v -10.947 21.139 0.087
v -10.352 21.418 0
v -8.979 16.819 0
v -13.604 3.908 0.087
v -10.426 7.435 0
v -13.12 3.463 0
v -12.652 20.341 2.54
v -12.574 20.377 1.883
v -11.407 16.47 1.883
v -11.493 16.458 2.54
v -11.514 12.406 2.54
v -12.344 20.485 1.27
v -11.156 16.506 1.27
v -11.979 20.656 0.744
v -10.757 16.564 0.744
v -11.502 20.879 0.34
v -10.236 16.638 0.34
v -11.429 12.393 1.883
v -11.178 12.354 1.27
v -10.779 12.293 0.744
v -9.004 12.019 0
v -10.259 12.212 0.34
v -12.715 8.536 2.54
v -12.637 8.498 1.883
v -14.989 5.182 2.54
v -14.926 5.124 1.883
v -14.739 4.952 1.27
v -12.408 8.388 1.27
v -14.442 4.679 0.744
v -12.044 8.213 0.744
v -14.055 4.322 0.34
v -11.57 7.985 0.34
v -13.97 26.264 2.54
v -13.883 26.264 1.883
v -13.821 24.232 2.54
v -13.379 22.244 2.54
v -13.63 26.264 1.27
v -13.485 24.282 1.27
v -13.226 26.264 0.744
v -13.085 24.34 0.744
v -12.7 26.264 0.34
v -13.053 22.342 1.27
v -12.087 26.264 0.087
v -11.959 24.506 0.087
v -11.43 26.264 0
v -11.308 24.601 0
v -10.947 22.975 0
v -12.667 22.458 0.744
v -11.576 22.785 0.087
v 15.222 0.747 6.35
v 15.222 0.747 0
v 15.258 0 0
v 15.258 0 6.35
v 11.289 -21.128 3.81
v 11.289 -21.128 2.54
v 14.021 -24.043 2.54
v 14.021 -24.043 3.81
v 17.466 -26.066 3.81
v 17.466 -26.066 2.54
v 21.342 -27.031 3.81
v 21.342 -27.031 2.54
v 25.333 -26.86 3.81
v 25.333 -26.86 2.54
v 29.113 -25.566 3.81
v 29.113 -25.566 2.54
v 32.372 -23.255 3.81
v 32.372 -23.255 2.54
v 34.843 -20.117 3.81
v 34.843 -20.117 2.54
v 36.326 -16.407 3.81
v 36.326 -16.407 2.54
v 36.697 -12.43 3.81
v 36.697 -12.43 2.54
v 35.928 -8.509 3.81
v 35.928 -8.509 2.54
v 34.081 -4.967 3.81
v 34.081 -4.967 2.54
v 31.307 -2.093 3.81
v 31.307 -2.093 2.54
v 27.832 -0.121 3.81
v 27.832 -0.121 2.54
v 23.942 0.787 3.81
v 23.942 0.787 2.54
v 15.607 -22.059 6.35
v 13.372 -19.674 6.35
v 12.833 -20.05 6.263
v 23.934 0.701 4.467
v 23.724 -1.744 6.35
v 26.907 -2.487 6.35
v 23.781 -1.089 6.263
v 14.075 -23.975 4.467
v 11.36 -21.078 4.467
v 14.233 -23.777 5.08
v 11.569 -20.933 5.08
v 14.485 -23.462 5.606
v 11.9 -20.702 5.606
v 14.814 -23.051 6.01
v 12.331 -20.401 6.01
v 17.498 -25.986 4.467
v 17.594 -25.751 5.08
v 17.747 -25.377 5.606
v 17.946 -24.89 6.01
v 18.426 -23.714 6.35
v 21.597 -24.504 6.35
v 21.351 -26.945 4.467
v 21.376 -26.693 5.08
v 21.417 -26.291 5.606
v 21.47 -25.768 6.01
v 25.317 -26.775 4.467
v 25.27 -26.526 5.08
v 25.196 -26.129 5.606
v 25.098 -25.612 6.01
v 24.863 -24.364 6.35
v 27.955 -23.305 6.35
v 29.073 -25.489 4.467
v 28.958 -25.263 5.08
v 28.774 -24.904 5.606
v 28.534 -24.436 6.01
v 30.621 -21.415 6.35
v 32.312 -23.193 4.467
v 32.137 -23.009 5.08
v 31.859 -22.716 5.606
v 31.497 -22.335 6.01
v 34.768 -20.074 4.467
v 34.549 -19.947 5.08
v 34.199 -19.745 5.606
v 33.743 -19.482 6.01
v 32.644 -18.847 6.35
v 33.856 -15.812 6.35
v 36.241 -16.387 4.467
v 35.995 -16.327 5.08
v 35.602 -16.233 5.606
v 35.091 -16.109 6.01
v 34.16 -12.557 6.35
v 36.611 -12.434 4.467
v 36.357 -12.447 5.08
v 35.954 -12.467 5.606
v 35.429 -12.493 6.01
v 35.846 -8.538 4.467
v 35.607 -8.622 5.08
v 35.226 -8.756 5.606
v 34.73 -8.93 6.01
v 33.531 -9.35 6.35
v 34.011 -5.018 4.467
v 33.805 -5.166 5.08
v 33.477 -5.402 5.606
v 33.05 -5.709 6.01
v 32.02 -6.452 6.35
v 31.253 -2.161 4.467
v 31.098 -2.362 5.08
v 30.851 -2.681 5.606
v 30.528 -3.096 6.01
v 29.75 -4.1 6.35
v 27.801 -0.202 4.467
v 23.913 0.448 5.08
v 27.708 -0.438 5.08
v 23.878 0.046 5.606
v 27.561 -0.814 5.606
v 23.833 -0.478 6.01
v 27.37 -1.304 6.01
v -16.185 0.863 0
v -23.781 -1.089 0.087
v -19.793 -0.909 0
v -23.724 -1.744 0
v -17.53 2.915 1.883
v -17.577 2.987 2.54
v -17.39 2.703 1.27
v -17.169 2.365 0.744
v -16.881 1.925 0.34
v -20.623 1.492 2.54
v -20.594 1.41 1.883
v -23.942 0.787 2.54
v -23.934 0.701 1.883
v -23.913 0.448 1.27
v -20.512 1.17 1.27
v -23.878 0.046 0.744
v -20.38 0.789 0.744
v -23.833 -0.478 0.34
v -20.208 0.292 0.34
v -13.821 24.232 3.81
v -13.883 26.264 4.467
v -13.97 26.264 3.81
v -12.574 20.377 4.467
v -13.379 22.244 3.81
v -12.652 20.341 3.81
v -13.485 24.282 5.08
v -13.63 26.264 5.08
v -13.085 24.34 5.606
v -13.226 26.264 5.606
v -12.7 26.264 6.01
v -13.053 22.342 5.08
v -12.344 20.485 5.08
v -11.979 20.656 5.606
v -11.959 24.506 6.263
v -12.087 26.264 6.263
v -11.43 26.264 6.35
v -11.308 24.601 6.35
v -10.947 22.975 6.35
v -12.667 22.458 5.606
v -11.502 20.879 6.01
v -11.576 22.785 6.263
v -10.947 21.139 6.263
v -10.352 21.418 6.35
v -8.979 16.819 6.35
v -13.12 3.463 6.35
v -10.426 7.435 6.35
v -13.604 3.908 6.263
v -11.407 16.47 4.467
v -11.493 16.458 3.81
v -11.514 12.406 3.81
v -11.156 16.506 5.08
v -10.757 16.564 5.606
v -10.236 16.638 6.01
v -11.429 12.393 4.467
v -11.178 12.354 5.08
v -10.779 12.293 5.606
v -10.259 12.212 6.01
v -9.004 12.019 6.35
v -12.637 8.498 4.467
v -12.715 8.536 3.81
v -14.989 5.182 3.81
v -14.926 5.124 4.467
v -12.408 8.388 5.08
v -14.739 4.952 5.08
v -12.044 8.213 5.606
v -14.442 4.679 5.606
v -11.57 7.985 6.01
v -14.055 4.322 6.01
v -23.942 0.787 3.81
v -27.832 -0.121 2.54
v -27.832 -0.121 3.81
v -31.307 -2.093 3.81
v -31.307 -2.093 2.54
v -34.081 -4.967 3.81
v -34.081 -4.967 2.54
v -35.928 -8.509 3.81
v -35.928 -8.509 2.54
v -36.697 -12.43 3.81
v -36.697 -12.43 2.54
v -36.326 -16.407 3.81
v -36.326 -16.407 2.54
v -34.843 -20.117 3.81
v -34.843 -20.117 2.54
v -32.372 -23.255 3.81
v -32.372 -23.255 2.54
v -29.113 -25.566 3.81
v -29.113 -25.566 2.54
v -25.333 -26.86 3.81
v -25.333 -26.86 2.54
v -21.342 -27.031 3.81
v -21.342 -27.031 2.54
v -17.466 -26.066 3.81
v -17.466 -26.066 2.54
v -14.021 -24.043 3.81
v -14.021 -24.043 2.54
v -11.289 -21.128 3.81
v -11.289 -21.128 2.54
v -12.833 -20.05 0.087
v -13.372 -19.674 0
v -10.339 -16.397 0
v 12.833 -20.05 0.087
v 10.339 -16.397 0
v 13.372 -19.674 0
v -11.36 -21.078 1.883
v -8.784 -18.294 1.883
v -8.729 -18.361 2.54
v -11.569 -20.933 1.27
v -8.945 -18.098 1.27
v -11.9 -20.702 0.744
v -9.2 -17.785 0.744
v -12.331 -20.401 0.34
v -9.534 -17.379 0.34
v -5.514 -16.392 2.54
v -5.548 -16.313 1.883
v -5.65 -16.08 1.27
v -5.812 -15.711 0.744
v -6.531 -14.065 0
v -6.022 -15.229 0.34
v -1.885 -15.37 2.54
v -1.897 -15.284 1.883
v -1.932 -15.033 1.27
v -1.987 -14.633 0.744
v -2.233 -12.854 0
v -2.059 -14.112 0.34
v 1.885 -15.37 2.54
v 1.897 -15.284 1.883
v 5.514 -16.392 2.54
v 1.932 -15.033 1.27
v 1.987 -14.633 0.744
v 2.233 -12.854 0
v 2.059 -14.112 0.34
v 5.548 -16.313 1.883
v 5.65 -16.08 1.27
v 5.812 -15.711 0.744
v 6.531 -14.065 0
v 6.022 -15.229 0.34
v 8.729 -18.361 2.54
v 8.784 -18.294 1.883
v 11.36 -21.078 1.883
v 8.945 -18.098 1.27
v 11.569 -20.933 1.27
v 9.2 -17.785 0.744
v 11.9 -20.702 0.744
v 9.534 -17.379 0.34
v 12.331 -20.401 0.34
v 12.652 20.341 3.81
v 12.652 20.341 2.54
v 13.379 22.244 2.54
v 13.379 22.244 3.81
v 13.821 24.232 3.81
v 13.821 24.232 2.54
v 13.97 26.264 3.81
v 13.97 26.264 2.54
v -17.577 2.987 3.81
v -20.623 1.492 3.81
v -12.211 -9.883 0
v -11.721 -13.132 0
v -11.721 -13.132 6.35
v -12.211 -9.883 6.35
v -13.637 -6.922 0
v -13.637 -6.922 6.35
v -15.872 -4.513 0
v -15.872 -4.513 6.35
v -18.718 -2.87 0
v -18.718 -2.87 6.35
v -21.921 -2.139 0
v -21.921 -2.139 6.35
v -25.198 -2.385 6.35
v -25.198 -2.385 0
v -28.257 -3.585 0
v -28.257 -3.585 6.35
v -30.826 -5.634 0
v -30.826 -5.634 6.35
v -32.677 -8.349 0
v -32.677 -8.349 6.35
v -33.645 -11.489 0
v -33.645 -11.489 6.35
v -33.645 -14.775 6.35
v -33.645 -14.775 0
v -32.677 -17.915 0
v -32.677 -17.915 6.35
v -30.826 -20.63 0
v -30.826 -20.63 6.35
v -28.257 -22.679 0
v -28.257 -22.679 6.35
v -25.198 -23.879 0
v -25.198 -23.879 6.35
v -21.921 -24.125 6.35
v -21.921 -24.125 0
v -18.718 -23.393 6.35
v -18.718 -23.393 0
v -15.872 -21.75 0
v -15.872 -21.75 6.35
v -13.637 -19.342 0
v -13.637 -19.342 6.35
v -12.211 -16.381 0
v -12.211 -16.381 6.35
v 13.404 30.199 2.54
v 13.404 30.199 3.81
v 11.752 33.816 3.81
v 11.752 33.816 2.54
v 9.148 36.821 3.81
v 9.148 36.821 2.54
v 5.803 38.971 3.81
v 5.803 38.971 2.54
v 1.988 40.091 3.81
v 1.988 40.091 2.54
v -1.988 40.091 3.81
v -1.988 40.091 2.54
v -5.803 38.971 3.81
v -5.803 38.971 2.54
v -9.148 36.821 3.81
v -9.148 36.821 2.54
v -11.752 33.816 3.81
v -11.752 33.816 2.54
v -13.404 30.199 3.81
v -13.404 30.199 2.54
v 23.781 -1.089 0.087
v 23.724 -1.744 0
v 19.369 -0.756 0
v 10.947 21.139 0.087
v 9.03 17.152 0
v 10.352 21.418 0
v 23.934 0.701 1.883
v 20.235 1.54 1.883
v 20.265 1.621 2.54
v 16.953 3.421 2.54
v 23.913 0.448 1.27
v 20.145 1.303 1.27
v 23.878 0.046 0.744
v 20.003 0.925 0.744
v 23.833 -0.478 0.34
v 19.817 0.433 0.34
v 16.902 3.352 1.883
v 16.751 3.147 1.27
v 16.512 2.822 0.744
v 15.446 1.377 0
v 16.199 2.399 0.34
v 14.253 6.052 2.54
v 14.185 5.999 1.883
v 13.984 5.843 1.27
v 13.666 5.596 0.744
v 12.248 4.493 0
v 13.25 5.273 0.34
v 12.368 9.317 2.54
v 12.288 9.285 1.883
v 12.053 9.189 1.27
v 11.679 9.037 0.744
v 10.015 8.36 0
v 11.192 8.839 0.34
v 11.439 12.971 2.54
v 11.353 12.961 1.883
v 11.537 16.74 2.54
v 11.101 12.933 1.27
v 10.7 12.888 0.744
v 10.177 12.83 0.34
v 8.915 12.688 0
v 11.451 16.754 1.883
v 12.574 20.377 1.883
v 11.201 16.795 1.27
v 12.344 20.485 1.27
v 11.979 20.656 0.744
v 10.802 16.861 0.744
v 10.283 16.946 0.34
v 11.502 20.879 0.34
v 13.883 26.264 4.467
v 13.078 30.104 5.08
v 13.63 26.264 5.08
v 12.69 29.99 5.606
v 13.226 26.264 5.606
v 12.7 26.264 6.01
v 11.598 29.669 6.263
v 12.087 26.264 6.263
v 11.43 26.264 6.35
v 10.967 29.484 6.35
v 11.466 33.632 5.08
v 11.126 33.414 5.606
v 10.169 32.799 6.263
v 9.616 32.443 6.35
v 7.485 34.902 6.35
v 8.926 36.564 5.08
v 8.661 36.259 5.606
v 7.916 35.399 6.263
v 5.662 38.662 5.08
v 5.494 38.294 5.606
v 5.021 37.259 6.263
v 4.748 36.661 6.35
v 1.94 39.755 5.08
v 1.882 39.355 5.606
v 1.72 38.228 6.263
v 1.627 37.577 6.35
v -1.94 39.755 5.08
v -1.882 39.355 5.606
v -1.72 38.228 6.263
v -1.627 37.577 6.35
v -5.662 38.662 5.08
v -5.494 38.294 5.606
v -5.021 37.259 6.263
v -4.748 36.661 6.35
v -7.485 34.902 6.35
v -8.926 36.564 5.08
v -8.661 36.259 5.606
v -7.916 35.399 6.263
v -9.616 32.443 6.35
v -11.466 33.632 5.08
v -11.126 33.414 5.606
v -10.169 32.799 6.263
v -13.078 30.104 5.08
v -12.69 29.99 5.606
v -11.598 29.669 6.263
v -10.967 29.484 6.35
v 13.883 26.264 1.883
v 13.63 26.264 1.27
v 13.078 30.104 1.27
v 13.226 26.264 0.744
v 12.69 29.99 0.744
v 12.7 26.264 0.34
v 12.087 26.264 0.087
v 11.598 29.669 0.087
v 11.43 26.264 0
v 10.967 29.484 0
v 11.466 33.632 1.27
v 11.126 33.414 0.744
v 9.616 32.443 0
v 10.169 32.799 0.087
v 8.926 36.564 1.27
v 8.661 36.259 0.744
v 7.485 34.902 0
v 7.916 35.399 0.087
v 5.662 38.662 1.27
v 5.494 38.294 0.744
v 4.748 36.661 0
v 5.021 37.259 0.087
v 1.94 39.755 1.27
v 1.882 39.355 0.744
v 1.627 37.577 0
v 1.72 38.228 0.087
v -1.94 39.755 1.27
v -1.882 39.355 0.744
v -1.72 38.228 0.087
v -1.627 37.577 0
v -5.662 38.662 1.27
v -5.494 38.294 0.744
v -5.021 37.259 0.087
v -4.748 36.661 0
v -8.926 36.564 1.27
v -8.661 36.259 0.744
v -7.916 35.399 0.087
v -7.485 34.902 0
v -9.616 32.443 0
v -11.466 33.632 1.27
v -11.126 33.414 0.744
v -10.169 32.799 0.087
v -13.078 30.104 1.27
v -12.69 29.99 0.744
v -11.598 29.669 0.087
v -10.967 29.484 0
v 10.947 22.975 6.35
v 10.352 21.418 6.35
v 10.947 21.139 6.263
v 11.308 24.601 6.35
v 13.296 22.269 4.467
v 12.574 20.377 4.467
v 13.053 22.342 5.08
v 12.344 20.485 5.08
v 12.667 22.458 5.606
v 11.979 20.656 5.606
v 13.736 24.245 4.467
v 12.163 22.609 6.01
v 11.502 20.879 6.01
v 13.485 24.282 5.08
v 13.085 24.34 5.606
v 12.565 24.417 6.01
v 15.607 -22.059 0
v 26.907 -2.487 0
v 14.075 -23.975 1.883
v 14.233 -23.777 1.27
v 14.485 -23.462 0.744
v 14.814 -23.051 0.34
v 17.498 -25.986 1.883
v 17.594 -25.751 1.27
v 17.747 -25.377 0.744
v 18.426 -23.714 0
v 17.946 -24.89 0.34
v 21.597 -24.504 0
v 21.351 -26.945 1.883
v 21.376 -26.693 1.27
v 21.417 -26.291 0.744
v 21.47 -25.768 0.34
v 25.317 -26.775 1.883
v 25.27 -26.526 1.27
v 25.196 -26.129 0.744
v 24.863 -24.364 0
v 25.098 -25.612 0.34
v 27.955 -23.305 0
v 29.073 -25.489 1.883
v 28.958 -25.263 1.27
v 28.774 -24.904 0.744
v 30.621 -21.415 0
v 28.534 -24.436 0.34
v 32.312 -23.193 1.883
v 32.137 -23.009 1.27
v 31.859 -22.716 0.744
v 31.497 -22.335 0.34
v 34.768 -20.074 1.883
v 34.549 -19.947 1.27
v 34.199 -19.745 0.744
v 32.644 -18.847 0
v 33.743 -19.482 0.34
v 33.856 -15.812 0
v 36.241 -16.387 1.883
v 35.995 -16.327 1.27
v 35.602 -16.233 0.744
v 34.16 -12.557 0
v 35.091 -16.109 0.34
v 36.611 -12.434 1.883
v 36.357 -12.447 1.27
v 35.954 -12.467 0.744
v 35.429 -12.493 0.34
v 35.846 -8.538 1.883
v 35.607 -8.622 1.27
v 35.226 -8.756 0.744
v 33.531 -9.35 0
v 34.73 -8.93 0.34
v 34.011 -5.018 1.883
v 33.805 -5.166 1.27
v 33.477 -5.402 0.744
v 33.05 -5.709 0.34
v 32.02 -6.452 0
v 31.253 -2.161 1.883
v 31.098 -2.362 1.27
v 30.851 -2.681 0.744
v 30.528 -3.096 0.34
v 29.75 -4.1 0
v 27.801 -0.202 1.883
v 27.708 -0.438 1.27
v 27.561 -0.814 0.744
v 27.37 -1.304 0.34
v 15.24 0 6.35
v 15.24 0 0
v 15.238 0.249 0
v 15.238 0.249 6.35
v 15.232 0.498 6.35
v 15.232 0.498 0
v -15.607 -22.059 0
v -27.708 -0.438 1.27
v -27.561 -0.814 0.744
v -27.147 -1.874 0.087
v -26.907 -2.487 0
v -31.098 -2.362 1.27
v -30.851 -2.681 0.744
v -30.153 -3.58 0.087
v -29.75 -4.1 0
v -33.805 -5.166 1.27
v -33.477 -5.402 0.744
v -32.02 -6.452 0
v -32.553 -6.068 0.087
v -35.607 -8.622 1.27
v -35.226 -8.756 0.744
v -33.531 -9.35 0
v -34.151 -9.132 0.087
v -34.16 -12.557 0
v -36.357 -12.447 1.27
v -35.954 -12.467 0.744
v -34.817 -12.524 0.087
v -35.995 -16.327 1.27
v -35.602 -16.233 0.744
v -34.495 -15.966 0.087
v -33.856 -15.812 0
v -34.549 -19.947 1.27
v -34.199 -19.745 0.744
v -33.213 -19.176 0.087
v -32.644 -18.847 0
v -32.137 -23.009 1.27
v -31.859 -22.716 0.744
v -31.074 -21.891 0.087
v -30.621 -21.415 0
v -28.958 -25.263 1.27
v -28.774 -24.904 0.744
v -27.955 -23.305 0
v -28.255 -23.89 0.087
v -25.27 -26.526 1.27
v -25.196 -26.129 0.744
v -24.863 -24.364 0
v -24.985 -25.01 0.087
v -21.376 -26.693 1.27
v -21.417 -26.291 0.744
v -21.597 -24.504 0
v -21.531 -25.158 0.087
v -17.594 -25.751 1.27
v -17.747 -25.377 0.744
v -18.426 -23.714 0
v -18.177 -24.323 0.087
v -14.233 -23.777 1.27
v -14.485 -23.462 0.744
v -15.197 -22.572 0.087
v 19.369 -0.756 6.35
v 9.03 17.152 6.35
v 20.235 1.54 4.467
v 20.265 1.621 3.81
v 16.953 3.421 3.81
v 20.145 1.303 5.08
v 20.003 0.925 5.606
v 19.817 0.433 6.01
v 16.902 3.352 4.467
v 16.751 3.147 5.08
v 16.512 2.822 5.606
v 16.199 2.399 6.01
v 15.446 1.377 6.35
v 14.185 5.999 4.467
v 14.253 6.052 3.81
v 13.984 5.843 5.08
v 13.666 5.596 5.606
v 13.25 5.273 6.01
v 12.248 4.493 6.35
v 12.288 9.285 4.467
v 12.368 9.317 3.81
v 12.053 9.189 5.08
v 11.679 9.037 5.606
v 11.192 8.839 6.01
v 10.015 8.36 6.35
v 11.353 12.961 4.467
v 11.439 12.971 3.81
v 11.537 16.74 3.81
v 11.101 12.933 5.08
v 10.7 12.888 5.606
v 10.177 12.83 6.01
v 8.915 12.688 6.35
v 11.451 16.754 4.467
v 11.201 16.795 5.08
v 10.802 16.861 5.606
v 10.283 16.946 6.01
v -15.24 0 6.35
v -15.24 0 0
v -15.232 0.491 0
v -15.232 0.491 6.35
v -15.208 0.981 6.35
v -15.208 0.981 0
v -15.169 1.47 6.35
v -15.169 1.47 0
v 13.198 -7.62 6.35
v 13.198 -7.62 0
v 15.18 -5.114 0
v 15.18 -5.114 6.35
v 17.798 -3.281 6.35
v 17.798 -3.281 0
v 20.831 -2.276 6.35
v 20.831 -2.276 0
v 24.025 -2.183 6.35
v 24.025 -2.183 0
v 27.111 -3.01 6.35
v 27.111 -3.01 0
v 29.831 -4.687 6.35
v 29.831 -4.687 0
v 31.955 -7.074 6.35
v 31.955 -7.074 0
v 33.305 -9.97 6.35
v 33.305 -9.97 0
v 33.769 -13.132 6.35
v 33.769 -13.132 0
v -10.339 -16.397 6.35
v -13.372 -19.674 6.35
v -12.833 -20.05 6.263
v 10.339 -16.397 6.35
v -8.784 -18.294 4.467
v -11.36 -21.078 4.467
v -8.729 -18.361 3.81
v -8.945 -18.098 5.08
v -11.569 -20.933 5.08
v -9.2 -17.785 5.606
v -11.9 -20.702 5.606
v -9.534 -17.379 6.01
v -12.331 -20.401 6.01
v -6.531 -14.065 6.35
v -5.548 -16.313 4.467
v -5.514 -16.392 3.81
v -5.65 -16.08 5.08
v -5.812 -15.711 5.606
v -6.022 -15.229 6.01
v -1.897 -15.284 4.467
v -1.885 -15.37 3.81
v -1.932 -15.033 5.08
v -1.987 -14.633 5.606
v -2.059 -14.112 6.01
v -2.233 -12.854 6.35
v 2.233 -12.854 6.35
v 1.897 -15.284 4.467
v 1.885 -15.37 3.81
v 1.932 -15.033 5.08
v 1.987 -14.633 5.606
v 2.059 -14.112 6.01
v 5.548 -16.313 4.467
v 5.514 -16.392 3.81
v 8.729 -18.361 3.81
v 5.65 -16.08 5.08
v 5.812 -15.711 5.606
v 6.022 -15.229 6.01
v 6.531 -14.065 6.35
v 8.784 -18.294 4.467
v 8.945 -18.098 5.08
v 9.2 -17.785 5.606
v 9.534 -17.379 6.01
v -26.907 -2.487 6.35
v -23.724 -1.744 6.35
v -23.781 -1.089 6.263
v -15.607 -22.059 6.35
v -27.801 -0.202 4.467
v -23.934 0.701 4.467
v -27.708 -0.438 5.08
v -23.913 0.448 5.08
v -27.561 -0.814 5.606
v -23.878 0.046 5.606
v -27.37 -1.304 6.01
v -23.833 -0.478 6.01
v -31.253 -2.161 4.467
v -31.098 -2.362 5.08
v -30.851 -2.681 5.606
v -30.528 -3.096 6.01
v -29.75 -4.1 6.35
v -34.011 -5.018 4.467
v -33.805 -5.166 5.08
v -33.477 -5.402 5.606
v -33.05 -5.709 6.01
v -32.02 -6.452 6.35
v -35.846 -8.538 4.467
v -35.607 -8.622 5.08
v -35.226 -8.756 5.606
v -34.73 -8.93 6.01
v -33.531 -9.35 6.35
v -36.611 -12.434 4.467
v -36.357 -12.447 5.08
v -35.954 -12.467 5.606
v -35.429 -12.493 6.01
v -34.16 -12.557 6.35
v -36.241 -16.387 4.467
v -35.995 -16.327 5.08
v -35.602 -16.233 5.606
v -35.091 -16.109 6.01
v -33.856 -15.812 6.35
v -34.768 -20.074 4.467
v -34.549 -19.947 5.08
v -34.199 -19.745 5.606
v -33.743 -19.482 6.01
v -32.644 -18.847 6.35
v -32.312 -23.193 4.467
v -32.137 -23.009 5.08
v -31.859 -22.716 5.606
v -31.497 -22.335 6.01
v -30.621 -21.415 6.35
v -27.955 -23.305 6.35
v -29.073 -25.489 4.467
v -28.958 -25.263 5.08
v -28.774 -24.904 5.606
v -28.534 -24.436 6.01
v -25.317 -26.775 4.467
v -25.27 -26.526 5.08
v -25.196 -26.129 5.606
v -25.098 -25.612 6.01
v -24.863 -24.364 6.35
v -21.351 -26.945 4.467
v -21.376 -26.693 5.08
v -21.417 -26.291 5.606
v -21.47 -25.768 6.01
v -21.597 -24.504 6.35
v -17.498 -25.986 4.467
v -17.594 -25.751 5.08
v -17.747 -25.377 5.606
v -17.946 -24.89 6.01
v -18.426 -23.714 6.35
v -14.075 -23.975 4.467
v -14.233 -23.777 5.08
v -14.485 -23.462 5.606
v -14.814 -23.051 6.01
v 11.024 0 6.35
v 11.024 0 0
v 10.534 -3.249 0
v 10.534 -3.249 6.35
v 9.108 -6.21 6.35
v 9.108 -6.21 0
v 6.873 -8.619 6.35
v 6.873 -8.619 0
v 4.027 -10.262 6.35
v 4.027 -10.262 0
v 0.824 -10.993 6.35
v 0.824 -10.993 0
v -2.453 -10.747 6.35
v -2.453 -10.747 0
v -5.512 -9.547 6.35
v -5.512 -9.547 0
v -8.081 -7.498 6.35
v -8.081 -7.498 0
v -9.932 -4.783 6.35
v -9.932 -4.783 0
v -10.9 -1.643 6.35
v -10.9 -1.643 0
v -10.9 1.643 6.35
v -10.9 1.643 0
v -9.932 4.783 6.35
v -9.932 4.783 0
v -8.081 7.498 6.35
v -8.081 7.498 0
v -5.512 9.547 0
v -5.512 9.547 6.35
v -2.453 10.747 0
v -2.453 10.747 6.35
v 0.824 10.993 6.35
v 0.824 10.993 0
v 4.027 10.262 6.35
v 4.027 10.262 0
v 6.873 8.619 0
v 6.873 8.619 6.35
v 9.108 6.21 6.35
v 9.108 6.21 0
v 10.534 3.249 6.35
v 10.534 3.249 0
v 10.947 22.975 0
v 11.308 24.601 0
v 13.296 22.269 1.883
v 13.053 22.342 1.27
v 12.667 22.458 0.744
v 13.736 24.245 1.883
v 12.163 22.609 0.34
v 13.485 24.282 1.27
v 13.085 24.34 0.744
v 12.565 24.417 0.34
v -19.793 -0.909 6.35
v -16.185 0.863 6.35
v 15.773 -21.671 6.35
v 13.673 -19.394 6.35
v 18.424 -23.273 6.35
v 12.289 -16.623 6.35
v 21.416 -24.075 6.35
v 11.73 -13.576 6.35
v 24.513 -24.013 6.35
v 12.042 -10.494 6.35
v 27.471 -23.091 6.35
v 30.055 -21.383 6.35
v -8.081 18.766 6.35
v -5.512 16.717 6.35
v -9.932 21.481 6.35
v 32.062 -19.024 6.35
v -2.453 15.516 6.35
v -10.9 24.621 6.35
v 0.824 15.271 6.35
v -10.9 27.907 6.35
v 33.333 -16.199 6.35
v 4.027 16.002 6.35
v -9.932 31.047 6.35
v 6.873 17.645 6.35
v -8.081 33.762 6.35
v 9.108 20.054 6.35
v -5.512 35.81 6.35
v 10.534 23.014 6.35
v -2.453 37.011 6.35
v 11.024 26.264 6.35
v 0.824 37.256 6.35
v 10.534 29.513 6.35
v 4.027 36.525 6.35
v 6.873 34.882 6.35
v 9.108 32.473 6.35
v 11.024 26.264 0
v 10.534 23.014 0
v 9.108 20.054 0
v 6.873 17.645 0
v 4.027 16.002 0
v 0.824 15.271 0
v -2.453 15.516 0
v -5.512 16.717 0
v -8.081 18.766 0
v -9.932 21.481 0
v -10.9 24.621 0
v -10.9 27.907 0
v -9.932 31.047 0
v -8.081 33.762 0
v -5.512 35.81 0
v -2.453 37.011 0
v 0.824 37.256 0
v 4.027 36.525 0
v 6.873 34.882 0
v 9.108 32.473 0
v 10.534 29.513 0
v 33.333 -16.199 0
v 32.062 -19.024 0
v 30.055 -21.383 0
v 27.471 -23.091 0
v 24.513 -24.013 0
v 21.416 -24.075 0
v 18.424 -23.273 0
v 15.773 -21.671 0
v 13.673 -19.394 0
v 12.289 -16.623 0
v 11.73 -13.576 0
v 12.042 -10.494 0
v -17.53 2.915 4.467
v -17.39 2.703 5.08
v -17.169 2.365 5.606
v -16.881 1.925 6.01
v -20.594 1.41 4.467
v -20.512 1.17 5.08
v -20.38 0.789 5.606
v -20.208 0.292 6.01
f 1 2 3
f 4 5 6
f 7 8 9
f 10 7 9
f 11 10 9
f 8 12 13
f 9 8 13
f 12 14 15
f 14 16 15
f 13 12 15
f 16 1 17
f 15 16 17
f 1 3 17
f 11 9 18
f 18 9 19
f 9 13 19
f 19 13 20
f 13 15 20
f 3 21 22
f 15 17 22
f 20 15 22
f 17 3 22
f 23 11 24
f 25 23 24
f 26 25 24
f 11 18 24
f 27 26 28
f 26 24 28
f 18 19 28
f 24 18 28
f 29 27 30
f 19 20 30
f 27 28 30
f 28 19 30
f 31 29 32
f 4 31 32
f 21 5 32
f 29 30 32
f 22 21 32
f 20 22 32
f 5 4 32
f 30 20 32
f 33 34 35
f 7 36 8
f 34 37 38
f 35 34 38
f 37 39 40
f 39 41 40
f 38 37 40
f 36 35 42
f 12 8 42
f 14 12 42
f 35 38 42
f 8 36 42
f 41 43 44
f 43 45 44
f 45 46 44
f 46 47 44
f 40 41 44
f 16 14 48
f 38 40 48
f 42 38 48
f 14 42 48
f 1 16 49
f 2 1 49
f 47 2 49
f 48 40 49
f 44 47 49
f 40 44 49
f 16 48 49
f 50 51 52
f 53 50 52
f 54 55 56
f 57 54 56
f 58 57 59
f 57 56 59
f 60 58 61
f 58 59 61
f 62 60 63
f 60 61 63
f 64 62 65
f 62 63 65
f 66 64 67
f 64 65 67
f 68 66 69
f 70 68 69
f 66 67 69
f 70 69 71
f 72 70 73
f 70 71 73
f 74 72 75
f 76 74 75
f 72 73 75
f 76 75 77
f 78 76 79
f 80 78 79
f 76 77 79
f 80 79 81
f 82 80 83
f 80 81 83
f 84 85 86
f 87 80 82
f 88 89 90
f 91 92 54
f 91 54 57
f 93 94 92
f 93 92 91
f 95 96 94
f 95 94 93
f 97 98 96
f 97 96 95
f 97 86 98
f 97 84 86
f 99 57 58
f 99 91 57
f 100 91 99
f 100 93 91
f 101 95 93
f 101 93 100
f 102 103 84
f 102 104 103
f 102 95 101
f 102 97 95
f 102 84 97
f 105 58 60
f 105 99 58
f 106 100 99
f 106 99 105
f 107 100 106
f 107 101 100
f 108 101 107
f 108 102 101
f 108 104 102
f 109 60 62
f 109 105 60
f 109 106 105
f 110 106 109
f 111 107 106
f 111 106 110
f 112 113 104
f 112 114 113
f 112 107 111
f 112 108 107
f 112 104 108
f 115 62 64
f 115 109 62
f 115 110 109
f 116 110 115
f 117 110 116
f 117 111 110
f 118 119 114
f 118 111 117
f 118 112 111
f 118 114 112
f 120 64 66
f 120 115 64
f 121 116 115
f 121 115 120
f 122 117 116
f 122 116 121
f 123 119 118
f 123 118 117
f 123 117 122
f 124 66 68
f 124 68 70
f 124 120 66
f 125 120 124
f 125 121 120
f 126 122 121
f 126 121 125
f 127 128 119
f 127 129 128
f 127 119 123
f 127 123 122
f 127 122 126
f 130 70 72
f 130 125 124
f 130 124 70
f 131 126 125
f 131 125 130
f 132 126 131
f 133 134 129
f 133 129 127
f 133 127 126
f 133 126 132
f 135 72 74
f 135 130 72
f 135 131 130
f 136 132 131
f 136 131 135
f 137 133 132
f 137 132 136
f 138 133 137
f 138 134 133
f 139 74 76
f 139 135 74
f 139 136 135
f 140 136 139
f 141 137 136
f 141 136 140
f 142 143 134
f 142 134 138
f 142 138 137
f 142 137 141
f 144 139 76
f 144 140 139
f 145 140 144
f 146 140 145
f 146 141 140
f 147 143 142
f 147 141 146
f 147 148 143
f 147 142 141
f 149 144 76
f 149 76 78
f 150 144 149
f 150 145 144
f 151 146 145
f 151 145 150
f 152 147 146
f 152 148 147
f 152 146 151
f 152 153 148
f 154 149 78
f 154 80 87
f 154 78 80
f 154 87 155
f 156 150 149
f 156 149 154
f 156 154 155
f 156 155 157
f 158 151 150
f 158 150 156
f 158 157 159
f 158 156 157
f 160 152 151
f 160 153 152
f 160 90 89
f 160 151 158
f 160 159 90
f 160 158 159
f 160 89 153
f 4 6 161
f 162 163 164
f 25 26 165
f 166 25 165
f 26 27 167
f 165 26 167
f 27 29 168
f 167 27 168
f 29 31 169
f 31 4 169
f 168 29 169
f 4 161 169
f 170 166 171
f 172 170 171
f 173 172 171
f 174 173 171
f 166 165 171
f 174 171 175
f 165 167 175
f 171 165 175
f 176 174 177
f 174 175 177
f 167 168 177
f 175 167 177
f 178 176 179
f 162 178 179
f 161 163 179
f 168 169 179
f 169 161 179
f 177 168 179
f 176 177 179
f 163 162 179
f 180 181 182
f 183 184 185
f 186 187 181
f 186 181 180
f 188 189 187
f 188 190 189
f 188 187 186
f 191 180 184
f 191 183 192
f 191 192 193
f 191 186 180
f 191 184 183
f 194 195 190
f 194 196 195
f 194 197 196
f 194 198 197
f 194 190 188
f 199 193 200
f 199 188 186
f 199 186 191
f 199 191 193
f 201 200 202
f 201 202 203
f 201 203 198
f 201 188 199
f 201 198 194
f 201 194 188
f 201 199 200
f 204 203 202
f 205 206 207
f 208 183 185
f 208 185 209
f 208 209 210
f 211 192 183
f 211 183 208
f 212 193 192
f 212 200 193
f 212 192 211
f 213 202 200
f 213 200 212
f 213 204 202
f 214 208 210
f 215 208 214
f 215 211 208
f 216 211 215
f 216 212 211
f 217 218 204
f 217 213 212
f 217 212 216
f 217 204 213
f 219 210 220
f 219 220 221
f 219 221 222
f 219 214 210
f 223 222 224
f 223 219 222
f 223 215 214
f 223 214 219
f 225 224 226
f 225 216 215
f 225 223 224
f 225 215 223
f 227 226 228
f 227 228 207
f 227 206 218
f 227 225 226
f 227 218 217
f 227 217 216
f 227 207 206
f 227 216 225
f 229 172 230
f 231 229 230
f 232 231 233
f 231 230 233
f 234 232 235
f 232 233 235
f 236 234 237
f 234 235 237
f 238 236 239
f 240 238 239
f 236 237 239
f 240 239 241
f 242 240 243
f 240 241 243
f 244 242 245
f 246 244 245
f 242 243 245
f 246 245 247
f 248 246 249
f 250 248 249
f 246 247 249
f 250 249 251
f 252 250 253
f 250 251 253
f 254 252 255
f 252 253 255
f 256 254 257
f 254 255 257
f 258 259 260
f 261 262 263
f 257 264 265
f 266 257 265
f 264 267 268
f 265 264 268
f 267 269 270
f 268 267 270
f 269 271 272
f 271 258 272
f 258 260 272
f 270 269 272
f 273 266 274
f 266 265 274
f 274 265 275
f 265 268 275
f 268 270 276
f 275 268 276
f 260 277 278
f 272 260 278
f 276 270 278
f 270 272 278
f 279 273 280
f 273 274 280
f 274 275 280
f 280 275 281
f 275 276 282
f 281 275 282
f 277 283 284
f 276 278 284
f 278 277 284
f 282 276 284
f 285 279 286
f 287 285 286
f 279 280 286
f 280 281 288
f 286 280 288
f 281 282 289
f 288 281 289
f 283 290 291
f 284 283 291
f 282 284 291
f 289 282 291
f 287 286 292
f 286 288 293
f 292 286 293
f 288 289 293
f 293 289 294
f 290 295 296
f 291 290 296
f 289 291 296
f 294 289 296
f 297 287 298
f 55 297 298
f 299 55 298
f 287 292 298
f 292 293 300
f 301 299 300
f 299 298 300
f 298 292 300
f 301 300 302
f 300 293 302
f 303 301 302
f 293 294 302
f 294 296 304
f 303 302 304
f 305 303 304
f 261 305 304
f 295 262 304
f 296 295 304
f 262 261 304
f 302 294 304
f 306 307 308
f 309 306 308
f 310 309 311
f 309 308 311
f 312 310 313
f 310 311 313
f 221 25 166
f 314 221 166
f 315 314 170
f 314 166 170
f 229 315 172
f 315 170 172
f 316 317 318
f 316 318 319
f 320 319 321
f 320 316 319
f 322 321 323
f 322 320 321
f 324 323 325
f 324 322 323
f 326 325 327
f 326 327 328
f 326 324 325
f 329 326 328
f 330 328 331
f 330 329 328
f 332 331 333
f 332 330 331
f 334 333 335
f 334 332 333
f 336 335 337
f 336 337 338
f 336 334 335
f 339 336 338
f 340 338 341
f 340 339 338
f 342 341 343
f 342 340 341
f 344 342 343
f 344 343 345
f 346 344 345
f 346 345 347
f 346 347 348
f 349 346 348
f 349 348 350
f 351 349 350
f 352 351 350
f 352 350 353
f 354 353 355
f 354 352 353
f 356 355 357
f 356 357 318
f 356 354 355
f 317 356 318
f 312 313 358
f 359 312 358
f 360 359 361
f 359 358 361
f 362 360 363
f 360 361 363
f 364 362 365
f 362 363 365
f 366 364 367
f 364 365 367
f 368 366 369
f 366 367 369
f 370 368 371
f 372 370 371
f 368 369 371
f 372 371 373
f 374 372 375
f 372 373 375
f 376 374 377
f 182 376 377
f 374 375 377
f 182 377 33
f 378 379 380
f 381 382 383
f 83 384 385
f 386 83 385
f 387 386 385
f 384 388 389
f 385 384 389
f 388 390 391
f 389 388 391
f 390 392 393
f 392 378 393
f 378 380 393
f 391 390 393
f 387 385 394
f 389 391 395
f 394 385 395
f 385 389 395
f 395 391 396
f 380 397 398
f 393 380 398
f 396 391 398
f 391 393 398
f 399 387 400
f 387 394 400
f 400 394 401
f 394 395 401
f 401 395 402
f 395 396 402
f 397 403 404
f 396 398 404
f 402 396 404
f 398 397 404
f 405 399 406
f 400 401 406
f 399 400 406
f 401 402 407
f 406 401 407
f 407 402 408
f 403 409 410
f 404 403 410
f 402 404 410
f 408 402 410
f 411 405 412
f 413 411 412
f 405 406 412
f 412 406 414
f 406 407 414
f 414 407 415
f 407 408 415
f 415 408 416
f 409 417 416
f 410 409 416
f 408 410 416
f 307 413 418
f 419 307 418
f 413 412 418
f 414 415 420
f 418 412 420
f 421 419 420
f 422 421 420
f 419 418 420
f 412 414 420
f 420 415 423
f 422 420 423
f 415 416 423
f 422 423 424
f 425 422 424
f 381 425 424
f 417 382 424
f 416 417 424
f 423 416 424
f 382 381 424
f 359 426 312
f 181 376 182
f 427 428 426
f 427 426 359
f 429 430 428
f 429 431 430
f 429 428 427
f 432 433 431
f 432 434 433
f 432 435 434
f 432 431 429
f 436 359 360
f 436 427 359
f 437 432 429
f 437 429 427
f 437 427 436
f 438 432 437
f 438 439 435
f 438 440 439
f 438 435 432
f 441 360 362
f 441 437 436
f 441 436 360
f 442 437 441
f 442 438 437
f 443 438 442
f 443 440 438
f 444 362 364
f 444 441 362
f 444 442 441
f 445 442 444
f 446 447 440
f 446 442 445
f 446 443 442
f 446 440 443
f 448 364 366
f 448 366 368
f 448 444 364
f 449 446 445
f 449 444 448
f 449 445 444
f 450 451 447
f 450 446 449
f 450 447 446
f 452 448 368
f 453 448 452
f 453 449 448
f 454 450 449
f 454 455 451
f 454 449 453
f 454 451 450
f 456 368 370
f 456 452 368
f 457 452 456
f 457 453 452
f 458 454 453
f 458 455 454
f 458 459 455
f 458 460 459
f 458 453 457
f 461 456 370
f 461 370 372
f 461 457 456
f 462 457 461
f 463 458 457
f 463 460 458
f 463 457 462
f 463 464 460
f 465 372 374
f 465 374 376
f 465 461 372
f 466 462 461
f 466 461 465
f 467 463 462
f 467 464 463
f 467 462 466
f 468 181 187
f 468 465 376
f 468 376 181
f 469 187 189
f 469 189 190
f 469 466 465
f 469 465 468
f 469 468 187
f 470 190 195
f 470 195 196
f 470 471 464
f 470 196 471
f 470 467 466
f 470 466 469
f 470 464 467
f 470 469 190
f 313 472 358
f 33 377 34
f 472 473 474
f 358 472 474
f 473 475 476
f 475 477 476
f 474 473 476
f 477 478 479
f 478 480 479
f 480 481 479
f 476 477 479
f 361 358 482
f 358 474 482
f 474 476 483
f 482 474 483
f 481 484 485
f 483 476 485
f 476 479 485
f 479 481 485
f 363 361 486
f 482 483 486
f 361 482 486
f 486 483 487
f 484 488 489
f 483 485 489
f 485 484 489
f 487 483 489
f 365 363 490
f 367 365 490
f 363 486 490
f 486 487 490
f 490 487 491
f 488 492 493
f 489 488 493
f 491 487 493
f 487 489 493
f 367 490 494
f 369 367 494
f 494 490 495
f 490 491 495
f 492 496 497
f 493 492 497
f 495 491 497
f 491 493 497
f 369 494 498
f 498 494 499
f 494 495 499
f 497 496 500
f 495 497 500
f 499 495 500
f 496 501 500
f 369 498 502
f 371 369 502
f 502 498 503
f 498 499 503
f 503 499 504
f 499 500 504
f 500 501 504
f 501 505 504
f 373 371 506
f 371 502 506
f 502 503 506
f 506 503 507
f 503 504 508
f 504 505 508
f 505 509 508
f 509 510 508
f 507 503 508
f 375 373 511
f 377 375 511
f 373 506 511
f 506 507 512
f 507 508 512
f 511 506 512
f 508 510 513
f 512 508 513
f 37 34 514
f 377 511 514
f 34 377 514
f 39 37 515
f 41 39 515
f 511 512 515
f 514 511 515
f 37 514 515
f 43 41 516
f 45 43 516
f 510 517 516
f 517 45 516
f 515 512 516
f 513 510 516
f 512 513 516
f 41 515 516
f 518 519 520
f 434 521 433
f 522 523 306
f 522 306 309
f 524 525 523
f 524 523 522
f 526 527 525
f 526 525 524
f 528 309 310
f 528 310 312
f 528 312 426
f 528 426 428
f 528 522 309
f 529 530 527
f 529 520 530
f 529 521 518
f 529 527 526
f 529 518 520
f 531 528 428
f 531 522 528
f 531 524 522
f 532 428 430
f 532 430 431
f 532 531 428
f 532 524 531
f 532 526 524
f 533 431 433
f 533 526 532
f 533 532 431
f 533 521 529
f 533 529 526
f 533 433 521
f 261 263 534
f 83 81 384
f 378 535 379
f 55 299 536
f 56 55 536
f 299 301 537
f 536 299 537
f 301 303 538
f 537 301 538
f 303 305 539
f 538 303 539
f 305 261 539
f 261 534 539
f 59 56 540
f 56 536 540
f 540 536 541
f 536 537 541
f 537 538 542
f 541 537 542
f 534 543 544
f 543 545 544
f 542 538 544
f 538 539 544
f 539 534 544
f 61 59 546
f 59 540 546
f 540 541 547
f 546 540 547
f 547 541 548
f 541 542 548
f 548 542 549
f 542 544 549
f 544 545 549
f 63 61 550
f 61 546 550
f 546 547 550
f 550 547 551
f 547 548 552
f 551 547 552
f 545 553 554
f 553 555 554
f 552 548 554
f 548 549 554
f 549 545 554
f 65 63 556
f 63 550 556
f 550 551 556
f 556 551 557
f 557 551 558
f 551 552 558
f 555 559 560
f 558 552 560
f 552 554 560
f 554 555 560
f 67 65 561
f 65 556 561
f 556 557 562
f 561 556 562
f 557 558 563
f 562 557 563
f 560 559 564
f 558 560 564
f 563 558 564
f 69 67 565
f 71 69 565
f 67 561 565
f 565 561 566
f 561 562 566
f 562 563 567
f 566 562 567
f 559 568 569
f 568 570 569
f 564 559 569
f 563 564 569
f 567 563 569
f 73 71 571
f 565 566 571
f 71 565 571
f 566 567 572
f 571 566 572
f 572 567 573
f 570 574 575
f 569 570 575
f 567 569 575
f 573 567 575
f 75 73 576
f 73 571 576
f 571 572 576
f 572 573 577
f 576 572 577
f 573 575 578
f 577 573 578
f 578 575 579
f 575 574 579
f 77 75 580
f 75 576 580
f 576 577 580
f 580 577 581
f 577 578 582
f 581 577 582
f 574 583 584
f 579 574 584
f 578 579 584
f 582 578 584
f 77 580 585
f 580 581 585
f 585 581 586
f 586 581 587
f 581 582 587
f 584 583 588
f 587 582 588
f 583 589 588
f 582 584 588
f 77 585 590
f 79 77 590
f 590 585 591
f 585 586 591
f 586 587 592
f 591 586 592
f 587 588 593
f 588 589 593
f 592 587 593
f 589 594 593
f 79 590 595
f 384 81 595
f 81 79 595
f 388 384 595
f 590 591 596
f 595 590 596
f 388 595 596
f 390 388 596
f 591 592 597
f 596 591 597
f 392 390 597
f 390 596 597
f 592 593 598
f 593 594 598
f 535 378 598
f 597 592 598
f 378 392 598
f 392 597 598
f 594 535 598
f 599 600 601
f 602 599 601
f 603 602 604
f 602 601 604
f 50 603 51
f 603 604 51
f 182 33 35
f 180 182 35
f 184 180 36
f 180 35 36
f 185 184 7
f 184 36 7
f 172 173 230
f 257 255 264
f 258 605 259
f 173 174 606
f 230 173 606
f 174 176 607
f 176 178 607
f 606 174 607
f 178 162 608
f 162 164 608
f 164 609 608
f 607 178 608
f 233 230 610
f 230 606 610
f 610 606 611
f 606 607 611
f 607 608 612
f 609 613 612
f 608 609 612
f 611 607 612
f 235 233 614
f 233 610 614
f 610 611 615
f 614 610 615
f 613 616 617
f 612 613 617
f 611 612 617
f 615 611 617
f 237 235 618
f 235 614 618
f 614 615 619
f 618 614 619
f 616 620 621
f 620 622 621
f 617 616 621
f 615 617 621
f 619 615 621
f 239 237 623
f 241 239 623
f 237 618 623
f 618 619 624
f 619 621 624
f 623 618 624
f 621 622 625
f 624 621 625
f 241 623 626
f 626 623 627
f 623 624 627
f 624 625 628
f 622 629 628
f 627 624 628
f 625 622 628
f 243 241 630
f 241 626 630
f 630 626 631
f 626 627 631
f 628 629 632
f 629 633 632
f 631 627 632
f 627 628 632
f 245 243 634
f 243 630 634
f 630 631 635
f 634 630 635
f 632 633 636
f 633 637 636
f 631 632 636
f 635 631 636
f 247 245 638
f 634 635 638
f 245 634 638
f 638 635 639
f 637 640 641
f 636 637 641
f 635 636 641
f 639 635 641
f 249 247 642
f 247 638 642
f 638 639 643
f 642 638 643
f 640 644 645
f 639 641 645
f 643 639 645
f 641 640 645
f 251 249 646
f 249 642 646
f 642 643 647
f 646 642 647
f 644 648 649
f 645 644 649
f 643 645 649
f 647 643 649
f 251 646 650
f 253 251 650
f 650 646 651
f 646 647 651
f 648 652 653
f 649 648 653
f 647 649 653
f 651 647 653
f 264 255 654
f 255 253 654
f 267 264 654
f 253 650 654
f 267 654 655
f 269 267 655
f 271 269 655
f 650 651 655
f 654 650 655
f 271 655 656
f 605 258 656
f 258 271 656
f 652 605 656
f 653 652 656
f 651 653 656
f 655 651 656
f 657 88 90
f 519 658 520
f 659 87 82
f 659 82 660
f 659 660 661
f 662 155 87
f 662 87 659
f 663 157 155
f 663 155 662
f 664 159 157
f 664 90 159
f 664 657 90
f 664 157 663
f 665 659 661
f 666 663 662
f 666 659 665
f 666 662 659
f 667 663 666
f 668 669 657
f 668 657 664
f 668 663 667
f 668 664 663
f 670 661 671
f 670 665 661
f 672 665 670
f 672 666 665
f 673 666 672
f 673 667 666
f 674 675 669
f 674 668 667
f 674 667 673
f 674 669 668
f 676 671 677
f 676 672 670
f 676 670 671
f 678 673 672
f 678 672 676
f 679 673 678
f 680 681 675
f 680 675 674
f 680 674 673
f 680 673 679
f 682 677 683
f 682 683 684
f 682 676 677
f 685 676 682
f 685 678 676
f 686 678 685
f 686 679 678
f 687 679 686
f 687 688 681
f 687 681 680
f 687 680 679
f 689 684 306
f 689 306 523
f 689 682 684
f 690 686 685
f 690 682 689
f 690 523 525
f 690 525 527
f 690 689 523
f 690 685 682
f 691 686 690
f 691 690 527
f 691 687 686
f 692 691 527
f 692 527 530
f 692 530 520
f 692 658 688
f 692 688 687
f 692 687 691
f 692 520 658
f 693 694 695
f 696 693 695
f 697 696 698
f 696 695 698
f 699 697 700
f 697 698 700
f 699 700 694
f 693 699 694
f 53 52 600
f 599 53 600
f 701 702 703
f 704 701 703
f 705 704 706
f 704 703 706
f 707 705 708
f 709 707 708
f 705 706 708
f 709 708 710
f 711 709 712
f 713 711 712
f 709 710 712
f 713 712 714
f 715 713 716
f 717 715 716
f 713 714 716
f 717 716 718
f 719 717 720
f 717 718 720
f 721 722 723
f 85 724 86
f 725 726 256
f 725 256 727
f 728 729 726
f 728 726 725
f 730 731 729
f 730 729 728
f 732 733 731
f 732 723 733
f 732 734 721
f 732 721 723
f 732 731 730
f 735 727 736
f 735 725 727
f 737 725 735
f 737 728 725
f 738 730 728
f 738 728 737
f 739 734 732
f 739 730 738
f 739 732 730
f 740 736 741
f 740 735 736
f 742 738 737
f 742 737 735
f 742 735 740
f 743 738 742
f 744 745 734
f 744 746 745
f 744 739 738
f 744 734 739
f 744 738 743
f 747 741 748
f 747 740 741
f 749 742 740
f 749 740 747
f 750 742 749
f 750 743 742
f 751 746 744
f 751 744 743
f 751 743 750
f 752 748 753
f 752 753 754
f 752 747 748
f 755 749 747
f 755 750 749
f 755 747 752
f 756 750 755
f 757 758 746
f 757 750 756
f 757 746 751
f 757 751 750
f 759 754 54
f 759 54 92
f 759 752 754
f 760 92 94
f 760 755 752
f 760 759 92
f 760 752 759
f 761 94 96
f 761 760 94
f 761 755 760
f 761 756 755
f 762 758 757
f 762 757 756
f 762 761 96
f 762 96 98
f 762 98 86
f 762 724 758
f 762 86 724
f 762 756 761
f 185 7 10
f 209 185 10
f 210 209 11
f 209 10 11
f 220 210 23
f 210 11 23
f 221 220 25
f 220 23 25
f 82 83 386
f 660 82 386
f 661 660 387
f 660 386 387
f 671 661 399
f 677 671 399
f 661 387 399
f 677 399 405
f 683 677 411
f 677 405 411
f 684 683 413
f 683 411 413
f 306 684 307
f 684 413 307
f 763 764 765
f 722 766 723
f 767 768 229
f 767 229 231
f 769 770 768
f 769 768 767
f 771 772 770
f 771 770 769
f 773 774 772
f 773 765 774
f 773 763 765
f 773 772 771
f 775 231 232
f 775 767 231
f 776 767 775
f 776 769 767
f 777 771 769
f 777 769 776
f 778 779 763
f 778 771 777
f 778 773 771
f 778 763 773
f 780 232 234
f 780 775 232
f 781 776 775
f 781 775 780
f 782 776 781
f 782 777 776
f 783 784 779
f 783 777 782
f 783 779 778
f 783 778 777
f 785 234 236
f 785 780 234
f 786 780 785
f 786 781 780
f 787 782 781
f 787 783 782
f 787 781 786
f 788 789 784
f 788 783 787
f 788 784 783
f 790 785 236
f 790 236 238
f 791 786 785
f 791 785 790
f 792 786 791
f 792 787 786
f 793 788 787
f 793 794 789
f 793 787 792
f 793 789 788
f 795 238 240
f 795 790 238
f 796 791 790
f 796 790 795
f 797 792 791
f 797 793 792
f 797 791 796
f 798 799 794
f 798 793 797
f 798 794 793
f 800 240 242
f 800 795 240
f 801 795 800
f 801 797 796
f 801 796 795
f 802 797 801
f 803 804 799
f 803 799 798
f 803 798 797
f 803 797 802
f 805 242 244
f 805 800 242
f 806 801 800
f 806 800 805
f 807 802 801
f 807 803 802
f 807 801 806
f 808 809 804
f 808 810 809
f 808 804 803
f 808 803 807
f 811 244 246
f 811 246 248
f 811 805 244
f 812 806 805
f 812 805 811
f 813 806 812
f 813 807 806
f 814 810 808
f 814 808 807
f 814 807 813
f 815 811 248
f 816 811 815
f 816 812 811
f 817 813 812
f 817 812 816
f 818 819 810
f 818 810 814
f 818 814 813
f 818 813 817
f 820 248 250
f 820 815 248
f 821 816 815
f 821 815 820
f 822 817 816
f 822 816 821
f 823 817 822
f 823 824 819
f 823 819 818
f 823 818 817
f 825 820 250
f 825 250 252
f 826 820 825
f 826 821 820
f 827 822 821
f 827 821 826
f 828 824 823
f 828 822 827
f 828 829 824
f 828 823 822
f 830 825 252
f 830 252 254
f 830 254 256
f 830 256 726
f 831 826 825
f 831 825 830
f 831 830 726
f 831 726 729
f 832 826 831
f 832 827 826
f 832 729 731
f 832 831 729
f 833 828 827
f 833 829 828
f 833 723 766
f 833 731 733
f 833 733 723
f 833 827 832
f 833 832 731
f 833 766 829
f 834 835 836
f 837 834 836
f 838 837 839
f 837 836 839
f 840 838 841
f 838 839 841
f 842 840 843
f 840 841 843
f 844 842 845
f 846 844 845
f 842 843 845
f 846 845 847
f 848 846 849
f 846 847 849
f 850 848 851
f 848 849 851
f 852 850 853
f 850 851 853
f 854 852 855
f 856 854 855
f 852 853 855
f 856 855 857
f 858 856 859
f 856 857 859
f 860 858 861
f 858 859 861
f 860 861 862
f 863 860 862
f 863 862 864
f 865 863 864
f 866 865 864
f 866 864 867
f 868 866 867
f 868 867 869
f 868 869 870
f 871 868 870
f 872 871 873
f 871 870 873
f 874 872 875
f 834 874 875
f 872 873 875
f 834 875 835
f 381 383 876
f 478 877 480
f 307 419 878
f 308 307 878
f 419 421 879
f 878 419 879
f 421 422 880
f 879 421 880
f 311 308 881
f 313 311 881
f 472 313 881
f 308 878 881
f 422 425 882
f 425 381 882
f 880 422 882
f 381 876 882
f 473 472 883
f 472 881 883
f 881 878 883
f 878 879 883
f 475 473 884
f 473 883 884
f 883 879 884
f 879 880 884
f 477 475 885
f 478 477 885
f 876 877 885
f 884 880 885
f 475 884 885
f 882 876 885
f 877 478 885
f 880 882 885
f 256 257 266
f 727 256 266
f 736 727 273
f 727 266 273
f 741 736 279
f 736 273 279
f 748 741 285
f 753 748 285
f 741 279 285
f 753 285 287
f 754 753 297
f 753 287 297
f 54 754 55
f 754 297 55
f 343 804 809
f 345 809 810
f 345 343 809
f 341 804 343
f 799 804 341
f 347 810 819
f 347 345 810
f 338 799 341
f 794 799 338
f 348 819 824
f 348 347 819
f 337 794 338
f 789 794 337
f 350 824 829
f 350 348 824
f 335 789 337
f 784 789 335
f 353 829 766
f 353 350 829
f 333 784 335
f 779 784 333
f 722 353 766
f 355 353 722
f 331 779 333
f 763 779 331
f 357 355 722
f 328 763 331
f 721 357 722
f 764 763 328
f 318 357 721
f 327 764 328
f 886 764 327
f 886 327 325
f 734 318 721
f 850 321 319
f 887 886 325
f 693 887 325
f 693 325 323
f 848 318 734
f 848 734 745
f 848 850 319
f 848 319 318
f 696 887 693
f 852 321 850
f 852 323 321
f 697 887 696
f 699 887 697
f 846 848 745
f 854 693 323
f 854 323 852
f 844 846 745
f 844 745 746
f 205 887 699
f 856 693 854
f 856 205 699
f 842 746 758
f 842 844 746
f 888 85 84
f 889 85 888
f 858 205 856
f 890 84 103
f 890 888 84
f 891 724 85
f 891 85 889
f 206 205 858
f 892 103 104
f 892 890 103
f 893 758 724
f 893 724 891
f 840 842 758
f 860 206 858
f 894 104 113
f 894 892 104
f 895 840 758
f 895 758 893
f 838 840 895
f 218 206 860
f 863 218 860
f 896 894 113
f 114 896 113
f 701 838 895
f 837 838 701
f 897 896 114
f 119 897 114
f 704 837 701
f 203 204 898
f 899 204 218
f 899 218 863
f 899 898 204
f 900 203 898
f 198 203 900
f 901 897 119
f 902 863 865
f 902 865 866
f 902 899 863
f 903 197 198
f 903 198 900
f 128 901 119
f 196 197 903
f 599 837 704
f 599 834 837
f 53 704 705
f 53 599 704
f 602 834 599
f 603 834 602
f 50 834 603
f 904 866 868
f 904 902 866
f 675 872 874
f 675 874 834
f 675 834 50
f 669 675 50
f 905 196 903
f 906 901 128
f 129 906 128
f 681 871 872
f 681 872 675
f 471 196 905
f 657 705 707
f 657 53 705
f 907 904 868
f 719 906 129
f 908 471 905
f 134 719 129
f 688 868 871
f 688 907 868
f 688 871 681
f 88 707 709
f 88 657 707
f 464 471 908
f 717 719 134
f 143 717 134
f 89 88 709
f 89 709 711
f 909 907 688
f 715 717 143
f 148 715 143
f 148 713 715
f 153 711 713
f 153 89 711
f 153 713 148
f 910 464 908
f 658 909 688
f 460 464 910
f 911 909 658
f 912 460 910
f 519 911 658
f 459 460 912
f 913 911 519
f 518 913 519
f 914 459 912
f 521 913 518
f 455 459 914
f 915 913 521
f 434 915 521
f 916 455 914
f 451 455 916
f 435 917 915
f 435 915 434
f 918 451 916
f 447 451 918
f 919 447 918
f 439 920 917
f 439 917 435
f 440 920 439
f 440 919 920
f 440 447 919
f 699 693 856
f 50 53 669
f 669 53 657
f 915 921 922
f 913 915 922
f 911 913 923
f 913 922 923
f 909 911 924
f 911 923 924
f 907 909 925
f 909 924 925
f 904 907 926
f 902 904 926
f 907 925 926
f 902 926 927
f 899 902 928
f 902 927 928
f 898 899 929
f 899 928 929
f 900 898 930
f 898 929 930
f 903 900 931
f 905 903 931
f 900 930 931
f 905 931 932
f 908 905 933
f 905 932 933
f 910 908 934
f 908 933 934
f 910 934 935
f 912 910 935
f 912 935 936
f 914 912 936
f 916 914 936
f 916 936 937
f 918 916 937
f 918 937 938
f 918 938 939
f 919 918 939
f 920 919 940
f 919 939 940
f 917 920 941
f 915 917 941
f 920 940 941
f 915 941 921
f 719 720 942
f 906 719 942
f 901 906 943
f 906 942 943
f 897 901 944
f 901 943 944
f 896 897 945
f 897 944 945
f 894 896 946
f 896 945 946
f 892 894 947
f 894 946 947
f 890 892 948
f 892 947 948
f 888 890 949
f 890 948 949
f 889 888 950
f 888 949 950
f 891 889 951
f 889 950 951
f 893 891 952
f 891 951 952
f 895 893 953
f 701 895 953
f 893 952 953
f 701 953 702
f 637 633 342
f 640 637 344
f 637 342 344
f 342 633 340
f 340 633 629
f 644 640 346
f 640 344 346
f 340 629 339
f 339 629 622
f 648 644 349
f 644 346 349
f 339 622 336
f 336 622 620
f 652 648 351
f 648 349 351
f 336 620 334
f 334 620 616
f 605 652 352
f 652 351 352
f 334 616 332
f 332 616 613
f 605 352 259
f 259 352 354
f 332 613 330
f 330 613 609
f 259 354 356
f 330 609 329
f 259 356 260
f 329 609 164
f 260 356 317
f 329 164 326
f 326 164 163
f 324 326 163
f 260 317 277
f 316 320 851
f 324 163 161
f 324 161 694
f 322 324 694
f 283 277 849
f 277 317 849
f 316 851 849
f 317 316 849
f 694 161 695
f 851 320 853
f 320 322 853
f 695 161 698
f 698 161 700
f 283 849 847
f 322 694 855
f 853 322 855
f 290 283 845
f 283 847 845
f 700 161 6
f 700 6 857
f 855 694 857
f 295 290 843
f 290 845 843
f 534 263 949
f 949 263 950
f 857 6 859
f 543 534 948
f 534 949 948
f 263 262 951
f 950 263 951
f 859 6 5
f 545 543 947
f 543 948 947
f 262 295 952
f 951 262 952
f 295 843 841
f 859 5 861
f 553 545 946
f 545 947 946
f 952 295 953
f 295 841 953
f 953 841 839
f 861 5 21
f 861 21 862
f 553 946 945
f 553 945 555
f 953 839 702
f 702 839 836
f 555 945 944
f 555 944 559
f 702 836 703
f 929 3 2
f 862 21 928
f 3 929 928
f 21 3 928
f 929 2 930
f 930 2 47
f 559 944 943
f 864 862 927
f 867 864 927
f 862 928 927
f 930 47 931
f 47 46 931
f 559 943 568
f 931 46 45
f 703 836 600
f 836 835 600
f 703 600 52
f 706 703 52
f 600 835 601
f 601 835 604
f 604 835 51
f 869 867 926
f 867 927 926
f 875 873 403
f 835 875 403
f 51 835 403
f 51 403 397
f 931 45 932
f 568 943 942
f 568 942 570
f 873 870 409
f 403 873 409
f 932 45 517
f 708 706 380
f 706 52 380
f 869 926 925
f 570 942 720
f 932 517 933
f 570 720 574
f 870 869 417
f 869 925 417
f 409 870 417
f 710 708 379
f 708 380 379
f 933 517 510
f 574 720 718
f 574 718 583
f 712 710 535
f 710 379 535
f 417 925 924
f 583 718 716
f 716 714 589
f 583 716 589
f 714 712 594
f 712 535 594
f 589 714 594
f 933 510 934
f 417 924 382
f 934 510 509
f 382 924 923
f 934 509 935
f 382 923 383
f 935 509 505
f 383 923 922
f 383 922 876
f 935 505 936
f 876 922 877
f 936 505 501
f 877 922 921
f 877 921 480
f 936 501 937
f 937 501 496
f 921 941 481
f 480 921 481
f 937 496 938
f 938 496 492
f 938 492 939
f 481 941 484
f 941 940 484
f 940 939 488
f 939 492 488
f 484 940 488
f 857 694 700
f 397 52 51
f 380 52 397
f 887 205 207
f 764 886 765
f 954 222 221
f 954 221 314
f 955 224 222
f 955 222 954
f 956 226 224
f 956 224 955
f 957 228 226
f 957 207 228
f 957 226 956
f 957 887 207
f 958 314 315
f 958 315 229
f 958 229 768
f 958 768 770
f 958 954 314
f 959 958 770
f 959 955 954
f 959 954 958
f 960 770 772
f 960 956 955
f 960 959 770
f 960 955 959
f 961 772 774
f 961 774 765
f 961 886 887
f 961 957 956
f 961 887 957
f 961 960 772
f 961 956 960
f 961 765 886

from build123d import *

# Parameters (mm, degrees)
F0_R     = 11.0236
F1_DEPTH = 6.35
F2_R     = 2.54


with BuildPart() as f1:
    # F0 (on Top) → F1 (new body)
    with BuildSketch(Plane.XY):
        with BuildLine():
            Line((11.0236, 26.2636), (13.97, 26.2636))
            ThreePointArc((13.97, 26.2636), (0, 40.2336), (-13.97, 26.2636))
            Line((-13.97, 26.2636), (-11.0236, 26.2636))
            ThreePointArc((-11.0236, 26.2636), (0, 37.2872), (11.0236, 26.2636))
        make_face()
        with BuildLine():
            ThreePointArc((-12.6523145779, 20.3407767017), (0, 12.2936), (12.6523145779, 20.3407767017))
            ThreePointArc((12.6523145779, 20.3407767017), (13.6366002848, 23.2297851287), (13.97, 26.2636))
            Line((13.97, 26.2636), (11.0236, 26.2636))
            ThreePointArc((11.0236, 26.2636), (0, 15.24), (-11.0236, 26.2636))
            Line((-11.0236, 26.2636), (-13.97, 26.2636))
            ThreePointArc((-13.97, 26.2636), (-13.6366002848, 23.2297851287), (-12.6523145779, 20.3407767017))
        make_face()
        with BuildLine():
            ThreePointArc((-11.0236, 0), (0, 11.0236), (11.0236, 0))
            Line((11.0236, 0), (15.24, 0))
            ThreePointArc((15.24, 0), (15.2241210431, -0.6955130947), (15.1765172618, -1.3895768426))
            ThreePointArc((15.1765172618, -1.3895768426), (19.3784227224, 0.4264974276), (23.9417866454, 0.7868374902))
            ThreePointArc((23.9417866454, 0.7868374902), (13.1982271537, 7.62), (12.6523145779, 20.3407767017))
            ThreePointArc((12.6523145779, 20.3407767017), (0, 12.2936), (-12.6523145779, 20.3407767017))
            ThreePointArc((-12.6523145779, 20.3407767017), (-11.5144939922, 12.4059285943), (-14.9894072898, 5.1822572461))
            Line((-14.9894072898, 5.1822572461), (-15.1688950932, 1.4704494726))
            Line((-15.1688950932, 1.4704494726), (-15.24, 0))
            Line((-15.24, 0), (-11.0236, 0))
        make_face()
        with BuildLine():
            Line((15.2583246667, 0), (15.24, 0))
            ThreePointArc((15.24, 0), (15.235423648, 0.3734518243), (15.2216973405, 0.7466793643))
            Line((15.2216973405, 0.7466793643), (15.2583246667, 0))
        make_face(mode=Mode.SUBTRACT)
        with BuildLine():
            ThreePointArc((-15.1765172618, -1.3895768426), (-15.2241210431, -0.6955130947), (-15.24, 0))
            ThreePointArc((-15.24, 0), (-15.2222133939, 0.7360838198), (-15.1688950932, 1.4704494726))
            Line((-15.1688950932, 1.4704494726), (-14.9894072898, 5.1822572461))
            ThreePointArc((-14.9894072898, 5.1822572461), (-19.0536054002, 2.1454227776), (-23.9417866454, 0.7868374902))
            ThreePointArc((-23.9417866454, 0.7868374902), (-19.3784227224, 0.4264974276), (-15.1765172618, -1.3895768426))
        make_face()
        with BuildLine():
            ThreePointArc((-8.7749447948, -13.1318), (-10.4793051328, -6.4448736746), (-15.1765172618, -1.3895768426))
            ThreePointArc((-15.1765172618, -1.3895768426), (-19.3784227224, 0.4264974276), (-23.9417866454, 0.7868374902))
            ThreePointArc((-23.9417866454, 0.7868374902), (-34.8433196857, -20.1168), (-11.2894720675, -21.127614192))
            ThreePointArc((-11.2894720675, -21.127614192), (-9.4183950913, -17.3227393934), (-8.7749447948, -13.1318))
        make_face()
        with Locations((-22.7449447948, -13.1318)):
            Circle(F0_R, mode=Mode.SUBTRACT)
        with BuildLine():
            Line((15.24, 0), (11.0236, 0))
            ThreePointArc((11.0236, 0), (0, -11.0236), (-11.0236, 0))
            Line((-11.0236, 0), (-15.24, 0))
            ThreePointArc((-15.24, 0), (-15.2241210431, -0.6955130947), (-15.1765172618, -1.3895768426))
            ThreePointArc((-15.1765172618, -1.3895768426), (-10.4793051328, -6.4448736746), (-8.7749447948, -13.1318))
            ThreePointArc((-8.7749447948, -13.1318), (-9.4183950913, -17.3227393934), (-11.2894720675, -21.127614192))
            ThreePointArc((-11.2894720675, -21.127614192), (0, -15.24), (11.2894720675, -21.127614192))
            ThreePointArc((11.2894720675, -21.127614192), (9.3198537542, -16.9954550766), (8.7916674771, -12.4484610684))
            ThreePointArc((8.7916674771, -12.4484610684), (10.646569904, -6.1468), (15.1765172618, -1.3895768426))
            ThreePointArc((15.1765172618, -1.3895768426), (15.2241210431, -0.6955130947), (15.24, 0))
        make_face()
        with BuildLine():
            ThreePointArc((23.9417866454, 0.7868374902), (19.3784227224, 0.4264974276), (15.1765172618, -1.3895768426))
            ThreePointArc((15.1765172618, -1.3895768426), (10.646569904, -6.1468), (8.7916674771, -12.4484610684))
            ThreePointArc((8.7916674771, -12.4484610684), (9.3198537542, -16.9954550766), (11.2894720675, -21.127614192))
            ThreePointArc((11.2894720675, -21.127614192), (26.9358841883, -26.4583497035), (36.7149447948, -13.1318))
            ThreePointArc((36.7149447948, -13.1318), (33.037679627, -3.6861391087), (23.9417866454, 0.7868374902))
        make_face()
        with BuildLine():
            ThreePointArc((33.7685447948, -13.1318), (19.8918271692, -23.7797799387), (13.1982271537, -7.62))
            ThreePointArc((13.1982271537, -7.62), (25.5980624204, -2.4838200613), (33.7685447948, -13.1318))
        make_face(mode=Mode.SUBTRACT)
    extrude(amount=F1_DEPTH)

    # F2
    f2_edges = [f1.edges().sort_by_distance(p)[0] for p in [
        (0, 40.2336, 6.35),
        (-13.198227, 7.62, 6.35),
        (-34.84332, -20.1168, 6.35),
        (0, -15.24, 6.35),
        (34.84332, -20.1168, 6.35),
        (13.198227, 7.62, 6.35),
        (-23.941787, 0.786837, 3.175),
        (-11.289472, -21.127614, 3.175),
        (-34.84332, -20.1168, 0),
        (11.289472, -21.127614, 3.175),
        (0, -15.24, 0),
        (23.941787, 0.786837, 3.175),
        (34.84332, -20.1168, 0),
        (12.652315, 20.340777, 3.175),
        (13.198227, 7.62, 0),
        (0, 40.2336, 0),
        (-13.198227, 7.62, 0),
    ]]
    fillet(f2_edges, radius=F2_R)


solid = f1.part
